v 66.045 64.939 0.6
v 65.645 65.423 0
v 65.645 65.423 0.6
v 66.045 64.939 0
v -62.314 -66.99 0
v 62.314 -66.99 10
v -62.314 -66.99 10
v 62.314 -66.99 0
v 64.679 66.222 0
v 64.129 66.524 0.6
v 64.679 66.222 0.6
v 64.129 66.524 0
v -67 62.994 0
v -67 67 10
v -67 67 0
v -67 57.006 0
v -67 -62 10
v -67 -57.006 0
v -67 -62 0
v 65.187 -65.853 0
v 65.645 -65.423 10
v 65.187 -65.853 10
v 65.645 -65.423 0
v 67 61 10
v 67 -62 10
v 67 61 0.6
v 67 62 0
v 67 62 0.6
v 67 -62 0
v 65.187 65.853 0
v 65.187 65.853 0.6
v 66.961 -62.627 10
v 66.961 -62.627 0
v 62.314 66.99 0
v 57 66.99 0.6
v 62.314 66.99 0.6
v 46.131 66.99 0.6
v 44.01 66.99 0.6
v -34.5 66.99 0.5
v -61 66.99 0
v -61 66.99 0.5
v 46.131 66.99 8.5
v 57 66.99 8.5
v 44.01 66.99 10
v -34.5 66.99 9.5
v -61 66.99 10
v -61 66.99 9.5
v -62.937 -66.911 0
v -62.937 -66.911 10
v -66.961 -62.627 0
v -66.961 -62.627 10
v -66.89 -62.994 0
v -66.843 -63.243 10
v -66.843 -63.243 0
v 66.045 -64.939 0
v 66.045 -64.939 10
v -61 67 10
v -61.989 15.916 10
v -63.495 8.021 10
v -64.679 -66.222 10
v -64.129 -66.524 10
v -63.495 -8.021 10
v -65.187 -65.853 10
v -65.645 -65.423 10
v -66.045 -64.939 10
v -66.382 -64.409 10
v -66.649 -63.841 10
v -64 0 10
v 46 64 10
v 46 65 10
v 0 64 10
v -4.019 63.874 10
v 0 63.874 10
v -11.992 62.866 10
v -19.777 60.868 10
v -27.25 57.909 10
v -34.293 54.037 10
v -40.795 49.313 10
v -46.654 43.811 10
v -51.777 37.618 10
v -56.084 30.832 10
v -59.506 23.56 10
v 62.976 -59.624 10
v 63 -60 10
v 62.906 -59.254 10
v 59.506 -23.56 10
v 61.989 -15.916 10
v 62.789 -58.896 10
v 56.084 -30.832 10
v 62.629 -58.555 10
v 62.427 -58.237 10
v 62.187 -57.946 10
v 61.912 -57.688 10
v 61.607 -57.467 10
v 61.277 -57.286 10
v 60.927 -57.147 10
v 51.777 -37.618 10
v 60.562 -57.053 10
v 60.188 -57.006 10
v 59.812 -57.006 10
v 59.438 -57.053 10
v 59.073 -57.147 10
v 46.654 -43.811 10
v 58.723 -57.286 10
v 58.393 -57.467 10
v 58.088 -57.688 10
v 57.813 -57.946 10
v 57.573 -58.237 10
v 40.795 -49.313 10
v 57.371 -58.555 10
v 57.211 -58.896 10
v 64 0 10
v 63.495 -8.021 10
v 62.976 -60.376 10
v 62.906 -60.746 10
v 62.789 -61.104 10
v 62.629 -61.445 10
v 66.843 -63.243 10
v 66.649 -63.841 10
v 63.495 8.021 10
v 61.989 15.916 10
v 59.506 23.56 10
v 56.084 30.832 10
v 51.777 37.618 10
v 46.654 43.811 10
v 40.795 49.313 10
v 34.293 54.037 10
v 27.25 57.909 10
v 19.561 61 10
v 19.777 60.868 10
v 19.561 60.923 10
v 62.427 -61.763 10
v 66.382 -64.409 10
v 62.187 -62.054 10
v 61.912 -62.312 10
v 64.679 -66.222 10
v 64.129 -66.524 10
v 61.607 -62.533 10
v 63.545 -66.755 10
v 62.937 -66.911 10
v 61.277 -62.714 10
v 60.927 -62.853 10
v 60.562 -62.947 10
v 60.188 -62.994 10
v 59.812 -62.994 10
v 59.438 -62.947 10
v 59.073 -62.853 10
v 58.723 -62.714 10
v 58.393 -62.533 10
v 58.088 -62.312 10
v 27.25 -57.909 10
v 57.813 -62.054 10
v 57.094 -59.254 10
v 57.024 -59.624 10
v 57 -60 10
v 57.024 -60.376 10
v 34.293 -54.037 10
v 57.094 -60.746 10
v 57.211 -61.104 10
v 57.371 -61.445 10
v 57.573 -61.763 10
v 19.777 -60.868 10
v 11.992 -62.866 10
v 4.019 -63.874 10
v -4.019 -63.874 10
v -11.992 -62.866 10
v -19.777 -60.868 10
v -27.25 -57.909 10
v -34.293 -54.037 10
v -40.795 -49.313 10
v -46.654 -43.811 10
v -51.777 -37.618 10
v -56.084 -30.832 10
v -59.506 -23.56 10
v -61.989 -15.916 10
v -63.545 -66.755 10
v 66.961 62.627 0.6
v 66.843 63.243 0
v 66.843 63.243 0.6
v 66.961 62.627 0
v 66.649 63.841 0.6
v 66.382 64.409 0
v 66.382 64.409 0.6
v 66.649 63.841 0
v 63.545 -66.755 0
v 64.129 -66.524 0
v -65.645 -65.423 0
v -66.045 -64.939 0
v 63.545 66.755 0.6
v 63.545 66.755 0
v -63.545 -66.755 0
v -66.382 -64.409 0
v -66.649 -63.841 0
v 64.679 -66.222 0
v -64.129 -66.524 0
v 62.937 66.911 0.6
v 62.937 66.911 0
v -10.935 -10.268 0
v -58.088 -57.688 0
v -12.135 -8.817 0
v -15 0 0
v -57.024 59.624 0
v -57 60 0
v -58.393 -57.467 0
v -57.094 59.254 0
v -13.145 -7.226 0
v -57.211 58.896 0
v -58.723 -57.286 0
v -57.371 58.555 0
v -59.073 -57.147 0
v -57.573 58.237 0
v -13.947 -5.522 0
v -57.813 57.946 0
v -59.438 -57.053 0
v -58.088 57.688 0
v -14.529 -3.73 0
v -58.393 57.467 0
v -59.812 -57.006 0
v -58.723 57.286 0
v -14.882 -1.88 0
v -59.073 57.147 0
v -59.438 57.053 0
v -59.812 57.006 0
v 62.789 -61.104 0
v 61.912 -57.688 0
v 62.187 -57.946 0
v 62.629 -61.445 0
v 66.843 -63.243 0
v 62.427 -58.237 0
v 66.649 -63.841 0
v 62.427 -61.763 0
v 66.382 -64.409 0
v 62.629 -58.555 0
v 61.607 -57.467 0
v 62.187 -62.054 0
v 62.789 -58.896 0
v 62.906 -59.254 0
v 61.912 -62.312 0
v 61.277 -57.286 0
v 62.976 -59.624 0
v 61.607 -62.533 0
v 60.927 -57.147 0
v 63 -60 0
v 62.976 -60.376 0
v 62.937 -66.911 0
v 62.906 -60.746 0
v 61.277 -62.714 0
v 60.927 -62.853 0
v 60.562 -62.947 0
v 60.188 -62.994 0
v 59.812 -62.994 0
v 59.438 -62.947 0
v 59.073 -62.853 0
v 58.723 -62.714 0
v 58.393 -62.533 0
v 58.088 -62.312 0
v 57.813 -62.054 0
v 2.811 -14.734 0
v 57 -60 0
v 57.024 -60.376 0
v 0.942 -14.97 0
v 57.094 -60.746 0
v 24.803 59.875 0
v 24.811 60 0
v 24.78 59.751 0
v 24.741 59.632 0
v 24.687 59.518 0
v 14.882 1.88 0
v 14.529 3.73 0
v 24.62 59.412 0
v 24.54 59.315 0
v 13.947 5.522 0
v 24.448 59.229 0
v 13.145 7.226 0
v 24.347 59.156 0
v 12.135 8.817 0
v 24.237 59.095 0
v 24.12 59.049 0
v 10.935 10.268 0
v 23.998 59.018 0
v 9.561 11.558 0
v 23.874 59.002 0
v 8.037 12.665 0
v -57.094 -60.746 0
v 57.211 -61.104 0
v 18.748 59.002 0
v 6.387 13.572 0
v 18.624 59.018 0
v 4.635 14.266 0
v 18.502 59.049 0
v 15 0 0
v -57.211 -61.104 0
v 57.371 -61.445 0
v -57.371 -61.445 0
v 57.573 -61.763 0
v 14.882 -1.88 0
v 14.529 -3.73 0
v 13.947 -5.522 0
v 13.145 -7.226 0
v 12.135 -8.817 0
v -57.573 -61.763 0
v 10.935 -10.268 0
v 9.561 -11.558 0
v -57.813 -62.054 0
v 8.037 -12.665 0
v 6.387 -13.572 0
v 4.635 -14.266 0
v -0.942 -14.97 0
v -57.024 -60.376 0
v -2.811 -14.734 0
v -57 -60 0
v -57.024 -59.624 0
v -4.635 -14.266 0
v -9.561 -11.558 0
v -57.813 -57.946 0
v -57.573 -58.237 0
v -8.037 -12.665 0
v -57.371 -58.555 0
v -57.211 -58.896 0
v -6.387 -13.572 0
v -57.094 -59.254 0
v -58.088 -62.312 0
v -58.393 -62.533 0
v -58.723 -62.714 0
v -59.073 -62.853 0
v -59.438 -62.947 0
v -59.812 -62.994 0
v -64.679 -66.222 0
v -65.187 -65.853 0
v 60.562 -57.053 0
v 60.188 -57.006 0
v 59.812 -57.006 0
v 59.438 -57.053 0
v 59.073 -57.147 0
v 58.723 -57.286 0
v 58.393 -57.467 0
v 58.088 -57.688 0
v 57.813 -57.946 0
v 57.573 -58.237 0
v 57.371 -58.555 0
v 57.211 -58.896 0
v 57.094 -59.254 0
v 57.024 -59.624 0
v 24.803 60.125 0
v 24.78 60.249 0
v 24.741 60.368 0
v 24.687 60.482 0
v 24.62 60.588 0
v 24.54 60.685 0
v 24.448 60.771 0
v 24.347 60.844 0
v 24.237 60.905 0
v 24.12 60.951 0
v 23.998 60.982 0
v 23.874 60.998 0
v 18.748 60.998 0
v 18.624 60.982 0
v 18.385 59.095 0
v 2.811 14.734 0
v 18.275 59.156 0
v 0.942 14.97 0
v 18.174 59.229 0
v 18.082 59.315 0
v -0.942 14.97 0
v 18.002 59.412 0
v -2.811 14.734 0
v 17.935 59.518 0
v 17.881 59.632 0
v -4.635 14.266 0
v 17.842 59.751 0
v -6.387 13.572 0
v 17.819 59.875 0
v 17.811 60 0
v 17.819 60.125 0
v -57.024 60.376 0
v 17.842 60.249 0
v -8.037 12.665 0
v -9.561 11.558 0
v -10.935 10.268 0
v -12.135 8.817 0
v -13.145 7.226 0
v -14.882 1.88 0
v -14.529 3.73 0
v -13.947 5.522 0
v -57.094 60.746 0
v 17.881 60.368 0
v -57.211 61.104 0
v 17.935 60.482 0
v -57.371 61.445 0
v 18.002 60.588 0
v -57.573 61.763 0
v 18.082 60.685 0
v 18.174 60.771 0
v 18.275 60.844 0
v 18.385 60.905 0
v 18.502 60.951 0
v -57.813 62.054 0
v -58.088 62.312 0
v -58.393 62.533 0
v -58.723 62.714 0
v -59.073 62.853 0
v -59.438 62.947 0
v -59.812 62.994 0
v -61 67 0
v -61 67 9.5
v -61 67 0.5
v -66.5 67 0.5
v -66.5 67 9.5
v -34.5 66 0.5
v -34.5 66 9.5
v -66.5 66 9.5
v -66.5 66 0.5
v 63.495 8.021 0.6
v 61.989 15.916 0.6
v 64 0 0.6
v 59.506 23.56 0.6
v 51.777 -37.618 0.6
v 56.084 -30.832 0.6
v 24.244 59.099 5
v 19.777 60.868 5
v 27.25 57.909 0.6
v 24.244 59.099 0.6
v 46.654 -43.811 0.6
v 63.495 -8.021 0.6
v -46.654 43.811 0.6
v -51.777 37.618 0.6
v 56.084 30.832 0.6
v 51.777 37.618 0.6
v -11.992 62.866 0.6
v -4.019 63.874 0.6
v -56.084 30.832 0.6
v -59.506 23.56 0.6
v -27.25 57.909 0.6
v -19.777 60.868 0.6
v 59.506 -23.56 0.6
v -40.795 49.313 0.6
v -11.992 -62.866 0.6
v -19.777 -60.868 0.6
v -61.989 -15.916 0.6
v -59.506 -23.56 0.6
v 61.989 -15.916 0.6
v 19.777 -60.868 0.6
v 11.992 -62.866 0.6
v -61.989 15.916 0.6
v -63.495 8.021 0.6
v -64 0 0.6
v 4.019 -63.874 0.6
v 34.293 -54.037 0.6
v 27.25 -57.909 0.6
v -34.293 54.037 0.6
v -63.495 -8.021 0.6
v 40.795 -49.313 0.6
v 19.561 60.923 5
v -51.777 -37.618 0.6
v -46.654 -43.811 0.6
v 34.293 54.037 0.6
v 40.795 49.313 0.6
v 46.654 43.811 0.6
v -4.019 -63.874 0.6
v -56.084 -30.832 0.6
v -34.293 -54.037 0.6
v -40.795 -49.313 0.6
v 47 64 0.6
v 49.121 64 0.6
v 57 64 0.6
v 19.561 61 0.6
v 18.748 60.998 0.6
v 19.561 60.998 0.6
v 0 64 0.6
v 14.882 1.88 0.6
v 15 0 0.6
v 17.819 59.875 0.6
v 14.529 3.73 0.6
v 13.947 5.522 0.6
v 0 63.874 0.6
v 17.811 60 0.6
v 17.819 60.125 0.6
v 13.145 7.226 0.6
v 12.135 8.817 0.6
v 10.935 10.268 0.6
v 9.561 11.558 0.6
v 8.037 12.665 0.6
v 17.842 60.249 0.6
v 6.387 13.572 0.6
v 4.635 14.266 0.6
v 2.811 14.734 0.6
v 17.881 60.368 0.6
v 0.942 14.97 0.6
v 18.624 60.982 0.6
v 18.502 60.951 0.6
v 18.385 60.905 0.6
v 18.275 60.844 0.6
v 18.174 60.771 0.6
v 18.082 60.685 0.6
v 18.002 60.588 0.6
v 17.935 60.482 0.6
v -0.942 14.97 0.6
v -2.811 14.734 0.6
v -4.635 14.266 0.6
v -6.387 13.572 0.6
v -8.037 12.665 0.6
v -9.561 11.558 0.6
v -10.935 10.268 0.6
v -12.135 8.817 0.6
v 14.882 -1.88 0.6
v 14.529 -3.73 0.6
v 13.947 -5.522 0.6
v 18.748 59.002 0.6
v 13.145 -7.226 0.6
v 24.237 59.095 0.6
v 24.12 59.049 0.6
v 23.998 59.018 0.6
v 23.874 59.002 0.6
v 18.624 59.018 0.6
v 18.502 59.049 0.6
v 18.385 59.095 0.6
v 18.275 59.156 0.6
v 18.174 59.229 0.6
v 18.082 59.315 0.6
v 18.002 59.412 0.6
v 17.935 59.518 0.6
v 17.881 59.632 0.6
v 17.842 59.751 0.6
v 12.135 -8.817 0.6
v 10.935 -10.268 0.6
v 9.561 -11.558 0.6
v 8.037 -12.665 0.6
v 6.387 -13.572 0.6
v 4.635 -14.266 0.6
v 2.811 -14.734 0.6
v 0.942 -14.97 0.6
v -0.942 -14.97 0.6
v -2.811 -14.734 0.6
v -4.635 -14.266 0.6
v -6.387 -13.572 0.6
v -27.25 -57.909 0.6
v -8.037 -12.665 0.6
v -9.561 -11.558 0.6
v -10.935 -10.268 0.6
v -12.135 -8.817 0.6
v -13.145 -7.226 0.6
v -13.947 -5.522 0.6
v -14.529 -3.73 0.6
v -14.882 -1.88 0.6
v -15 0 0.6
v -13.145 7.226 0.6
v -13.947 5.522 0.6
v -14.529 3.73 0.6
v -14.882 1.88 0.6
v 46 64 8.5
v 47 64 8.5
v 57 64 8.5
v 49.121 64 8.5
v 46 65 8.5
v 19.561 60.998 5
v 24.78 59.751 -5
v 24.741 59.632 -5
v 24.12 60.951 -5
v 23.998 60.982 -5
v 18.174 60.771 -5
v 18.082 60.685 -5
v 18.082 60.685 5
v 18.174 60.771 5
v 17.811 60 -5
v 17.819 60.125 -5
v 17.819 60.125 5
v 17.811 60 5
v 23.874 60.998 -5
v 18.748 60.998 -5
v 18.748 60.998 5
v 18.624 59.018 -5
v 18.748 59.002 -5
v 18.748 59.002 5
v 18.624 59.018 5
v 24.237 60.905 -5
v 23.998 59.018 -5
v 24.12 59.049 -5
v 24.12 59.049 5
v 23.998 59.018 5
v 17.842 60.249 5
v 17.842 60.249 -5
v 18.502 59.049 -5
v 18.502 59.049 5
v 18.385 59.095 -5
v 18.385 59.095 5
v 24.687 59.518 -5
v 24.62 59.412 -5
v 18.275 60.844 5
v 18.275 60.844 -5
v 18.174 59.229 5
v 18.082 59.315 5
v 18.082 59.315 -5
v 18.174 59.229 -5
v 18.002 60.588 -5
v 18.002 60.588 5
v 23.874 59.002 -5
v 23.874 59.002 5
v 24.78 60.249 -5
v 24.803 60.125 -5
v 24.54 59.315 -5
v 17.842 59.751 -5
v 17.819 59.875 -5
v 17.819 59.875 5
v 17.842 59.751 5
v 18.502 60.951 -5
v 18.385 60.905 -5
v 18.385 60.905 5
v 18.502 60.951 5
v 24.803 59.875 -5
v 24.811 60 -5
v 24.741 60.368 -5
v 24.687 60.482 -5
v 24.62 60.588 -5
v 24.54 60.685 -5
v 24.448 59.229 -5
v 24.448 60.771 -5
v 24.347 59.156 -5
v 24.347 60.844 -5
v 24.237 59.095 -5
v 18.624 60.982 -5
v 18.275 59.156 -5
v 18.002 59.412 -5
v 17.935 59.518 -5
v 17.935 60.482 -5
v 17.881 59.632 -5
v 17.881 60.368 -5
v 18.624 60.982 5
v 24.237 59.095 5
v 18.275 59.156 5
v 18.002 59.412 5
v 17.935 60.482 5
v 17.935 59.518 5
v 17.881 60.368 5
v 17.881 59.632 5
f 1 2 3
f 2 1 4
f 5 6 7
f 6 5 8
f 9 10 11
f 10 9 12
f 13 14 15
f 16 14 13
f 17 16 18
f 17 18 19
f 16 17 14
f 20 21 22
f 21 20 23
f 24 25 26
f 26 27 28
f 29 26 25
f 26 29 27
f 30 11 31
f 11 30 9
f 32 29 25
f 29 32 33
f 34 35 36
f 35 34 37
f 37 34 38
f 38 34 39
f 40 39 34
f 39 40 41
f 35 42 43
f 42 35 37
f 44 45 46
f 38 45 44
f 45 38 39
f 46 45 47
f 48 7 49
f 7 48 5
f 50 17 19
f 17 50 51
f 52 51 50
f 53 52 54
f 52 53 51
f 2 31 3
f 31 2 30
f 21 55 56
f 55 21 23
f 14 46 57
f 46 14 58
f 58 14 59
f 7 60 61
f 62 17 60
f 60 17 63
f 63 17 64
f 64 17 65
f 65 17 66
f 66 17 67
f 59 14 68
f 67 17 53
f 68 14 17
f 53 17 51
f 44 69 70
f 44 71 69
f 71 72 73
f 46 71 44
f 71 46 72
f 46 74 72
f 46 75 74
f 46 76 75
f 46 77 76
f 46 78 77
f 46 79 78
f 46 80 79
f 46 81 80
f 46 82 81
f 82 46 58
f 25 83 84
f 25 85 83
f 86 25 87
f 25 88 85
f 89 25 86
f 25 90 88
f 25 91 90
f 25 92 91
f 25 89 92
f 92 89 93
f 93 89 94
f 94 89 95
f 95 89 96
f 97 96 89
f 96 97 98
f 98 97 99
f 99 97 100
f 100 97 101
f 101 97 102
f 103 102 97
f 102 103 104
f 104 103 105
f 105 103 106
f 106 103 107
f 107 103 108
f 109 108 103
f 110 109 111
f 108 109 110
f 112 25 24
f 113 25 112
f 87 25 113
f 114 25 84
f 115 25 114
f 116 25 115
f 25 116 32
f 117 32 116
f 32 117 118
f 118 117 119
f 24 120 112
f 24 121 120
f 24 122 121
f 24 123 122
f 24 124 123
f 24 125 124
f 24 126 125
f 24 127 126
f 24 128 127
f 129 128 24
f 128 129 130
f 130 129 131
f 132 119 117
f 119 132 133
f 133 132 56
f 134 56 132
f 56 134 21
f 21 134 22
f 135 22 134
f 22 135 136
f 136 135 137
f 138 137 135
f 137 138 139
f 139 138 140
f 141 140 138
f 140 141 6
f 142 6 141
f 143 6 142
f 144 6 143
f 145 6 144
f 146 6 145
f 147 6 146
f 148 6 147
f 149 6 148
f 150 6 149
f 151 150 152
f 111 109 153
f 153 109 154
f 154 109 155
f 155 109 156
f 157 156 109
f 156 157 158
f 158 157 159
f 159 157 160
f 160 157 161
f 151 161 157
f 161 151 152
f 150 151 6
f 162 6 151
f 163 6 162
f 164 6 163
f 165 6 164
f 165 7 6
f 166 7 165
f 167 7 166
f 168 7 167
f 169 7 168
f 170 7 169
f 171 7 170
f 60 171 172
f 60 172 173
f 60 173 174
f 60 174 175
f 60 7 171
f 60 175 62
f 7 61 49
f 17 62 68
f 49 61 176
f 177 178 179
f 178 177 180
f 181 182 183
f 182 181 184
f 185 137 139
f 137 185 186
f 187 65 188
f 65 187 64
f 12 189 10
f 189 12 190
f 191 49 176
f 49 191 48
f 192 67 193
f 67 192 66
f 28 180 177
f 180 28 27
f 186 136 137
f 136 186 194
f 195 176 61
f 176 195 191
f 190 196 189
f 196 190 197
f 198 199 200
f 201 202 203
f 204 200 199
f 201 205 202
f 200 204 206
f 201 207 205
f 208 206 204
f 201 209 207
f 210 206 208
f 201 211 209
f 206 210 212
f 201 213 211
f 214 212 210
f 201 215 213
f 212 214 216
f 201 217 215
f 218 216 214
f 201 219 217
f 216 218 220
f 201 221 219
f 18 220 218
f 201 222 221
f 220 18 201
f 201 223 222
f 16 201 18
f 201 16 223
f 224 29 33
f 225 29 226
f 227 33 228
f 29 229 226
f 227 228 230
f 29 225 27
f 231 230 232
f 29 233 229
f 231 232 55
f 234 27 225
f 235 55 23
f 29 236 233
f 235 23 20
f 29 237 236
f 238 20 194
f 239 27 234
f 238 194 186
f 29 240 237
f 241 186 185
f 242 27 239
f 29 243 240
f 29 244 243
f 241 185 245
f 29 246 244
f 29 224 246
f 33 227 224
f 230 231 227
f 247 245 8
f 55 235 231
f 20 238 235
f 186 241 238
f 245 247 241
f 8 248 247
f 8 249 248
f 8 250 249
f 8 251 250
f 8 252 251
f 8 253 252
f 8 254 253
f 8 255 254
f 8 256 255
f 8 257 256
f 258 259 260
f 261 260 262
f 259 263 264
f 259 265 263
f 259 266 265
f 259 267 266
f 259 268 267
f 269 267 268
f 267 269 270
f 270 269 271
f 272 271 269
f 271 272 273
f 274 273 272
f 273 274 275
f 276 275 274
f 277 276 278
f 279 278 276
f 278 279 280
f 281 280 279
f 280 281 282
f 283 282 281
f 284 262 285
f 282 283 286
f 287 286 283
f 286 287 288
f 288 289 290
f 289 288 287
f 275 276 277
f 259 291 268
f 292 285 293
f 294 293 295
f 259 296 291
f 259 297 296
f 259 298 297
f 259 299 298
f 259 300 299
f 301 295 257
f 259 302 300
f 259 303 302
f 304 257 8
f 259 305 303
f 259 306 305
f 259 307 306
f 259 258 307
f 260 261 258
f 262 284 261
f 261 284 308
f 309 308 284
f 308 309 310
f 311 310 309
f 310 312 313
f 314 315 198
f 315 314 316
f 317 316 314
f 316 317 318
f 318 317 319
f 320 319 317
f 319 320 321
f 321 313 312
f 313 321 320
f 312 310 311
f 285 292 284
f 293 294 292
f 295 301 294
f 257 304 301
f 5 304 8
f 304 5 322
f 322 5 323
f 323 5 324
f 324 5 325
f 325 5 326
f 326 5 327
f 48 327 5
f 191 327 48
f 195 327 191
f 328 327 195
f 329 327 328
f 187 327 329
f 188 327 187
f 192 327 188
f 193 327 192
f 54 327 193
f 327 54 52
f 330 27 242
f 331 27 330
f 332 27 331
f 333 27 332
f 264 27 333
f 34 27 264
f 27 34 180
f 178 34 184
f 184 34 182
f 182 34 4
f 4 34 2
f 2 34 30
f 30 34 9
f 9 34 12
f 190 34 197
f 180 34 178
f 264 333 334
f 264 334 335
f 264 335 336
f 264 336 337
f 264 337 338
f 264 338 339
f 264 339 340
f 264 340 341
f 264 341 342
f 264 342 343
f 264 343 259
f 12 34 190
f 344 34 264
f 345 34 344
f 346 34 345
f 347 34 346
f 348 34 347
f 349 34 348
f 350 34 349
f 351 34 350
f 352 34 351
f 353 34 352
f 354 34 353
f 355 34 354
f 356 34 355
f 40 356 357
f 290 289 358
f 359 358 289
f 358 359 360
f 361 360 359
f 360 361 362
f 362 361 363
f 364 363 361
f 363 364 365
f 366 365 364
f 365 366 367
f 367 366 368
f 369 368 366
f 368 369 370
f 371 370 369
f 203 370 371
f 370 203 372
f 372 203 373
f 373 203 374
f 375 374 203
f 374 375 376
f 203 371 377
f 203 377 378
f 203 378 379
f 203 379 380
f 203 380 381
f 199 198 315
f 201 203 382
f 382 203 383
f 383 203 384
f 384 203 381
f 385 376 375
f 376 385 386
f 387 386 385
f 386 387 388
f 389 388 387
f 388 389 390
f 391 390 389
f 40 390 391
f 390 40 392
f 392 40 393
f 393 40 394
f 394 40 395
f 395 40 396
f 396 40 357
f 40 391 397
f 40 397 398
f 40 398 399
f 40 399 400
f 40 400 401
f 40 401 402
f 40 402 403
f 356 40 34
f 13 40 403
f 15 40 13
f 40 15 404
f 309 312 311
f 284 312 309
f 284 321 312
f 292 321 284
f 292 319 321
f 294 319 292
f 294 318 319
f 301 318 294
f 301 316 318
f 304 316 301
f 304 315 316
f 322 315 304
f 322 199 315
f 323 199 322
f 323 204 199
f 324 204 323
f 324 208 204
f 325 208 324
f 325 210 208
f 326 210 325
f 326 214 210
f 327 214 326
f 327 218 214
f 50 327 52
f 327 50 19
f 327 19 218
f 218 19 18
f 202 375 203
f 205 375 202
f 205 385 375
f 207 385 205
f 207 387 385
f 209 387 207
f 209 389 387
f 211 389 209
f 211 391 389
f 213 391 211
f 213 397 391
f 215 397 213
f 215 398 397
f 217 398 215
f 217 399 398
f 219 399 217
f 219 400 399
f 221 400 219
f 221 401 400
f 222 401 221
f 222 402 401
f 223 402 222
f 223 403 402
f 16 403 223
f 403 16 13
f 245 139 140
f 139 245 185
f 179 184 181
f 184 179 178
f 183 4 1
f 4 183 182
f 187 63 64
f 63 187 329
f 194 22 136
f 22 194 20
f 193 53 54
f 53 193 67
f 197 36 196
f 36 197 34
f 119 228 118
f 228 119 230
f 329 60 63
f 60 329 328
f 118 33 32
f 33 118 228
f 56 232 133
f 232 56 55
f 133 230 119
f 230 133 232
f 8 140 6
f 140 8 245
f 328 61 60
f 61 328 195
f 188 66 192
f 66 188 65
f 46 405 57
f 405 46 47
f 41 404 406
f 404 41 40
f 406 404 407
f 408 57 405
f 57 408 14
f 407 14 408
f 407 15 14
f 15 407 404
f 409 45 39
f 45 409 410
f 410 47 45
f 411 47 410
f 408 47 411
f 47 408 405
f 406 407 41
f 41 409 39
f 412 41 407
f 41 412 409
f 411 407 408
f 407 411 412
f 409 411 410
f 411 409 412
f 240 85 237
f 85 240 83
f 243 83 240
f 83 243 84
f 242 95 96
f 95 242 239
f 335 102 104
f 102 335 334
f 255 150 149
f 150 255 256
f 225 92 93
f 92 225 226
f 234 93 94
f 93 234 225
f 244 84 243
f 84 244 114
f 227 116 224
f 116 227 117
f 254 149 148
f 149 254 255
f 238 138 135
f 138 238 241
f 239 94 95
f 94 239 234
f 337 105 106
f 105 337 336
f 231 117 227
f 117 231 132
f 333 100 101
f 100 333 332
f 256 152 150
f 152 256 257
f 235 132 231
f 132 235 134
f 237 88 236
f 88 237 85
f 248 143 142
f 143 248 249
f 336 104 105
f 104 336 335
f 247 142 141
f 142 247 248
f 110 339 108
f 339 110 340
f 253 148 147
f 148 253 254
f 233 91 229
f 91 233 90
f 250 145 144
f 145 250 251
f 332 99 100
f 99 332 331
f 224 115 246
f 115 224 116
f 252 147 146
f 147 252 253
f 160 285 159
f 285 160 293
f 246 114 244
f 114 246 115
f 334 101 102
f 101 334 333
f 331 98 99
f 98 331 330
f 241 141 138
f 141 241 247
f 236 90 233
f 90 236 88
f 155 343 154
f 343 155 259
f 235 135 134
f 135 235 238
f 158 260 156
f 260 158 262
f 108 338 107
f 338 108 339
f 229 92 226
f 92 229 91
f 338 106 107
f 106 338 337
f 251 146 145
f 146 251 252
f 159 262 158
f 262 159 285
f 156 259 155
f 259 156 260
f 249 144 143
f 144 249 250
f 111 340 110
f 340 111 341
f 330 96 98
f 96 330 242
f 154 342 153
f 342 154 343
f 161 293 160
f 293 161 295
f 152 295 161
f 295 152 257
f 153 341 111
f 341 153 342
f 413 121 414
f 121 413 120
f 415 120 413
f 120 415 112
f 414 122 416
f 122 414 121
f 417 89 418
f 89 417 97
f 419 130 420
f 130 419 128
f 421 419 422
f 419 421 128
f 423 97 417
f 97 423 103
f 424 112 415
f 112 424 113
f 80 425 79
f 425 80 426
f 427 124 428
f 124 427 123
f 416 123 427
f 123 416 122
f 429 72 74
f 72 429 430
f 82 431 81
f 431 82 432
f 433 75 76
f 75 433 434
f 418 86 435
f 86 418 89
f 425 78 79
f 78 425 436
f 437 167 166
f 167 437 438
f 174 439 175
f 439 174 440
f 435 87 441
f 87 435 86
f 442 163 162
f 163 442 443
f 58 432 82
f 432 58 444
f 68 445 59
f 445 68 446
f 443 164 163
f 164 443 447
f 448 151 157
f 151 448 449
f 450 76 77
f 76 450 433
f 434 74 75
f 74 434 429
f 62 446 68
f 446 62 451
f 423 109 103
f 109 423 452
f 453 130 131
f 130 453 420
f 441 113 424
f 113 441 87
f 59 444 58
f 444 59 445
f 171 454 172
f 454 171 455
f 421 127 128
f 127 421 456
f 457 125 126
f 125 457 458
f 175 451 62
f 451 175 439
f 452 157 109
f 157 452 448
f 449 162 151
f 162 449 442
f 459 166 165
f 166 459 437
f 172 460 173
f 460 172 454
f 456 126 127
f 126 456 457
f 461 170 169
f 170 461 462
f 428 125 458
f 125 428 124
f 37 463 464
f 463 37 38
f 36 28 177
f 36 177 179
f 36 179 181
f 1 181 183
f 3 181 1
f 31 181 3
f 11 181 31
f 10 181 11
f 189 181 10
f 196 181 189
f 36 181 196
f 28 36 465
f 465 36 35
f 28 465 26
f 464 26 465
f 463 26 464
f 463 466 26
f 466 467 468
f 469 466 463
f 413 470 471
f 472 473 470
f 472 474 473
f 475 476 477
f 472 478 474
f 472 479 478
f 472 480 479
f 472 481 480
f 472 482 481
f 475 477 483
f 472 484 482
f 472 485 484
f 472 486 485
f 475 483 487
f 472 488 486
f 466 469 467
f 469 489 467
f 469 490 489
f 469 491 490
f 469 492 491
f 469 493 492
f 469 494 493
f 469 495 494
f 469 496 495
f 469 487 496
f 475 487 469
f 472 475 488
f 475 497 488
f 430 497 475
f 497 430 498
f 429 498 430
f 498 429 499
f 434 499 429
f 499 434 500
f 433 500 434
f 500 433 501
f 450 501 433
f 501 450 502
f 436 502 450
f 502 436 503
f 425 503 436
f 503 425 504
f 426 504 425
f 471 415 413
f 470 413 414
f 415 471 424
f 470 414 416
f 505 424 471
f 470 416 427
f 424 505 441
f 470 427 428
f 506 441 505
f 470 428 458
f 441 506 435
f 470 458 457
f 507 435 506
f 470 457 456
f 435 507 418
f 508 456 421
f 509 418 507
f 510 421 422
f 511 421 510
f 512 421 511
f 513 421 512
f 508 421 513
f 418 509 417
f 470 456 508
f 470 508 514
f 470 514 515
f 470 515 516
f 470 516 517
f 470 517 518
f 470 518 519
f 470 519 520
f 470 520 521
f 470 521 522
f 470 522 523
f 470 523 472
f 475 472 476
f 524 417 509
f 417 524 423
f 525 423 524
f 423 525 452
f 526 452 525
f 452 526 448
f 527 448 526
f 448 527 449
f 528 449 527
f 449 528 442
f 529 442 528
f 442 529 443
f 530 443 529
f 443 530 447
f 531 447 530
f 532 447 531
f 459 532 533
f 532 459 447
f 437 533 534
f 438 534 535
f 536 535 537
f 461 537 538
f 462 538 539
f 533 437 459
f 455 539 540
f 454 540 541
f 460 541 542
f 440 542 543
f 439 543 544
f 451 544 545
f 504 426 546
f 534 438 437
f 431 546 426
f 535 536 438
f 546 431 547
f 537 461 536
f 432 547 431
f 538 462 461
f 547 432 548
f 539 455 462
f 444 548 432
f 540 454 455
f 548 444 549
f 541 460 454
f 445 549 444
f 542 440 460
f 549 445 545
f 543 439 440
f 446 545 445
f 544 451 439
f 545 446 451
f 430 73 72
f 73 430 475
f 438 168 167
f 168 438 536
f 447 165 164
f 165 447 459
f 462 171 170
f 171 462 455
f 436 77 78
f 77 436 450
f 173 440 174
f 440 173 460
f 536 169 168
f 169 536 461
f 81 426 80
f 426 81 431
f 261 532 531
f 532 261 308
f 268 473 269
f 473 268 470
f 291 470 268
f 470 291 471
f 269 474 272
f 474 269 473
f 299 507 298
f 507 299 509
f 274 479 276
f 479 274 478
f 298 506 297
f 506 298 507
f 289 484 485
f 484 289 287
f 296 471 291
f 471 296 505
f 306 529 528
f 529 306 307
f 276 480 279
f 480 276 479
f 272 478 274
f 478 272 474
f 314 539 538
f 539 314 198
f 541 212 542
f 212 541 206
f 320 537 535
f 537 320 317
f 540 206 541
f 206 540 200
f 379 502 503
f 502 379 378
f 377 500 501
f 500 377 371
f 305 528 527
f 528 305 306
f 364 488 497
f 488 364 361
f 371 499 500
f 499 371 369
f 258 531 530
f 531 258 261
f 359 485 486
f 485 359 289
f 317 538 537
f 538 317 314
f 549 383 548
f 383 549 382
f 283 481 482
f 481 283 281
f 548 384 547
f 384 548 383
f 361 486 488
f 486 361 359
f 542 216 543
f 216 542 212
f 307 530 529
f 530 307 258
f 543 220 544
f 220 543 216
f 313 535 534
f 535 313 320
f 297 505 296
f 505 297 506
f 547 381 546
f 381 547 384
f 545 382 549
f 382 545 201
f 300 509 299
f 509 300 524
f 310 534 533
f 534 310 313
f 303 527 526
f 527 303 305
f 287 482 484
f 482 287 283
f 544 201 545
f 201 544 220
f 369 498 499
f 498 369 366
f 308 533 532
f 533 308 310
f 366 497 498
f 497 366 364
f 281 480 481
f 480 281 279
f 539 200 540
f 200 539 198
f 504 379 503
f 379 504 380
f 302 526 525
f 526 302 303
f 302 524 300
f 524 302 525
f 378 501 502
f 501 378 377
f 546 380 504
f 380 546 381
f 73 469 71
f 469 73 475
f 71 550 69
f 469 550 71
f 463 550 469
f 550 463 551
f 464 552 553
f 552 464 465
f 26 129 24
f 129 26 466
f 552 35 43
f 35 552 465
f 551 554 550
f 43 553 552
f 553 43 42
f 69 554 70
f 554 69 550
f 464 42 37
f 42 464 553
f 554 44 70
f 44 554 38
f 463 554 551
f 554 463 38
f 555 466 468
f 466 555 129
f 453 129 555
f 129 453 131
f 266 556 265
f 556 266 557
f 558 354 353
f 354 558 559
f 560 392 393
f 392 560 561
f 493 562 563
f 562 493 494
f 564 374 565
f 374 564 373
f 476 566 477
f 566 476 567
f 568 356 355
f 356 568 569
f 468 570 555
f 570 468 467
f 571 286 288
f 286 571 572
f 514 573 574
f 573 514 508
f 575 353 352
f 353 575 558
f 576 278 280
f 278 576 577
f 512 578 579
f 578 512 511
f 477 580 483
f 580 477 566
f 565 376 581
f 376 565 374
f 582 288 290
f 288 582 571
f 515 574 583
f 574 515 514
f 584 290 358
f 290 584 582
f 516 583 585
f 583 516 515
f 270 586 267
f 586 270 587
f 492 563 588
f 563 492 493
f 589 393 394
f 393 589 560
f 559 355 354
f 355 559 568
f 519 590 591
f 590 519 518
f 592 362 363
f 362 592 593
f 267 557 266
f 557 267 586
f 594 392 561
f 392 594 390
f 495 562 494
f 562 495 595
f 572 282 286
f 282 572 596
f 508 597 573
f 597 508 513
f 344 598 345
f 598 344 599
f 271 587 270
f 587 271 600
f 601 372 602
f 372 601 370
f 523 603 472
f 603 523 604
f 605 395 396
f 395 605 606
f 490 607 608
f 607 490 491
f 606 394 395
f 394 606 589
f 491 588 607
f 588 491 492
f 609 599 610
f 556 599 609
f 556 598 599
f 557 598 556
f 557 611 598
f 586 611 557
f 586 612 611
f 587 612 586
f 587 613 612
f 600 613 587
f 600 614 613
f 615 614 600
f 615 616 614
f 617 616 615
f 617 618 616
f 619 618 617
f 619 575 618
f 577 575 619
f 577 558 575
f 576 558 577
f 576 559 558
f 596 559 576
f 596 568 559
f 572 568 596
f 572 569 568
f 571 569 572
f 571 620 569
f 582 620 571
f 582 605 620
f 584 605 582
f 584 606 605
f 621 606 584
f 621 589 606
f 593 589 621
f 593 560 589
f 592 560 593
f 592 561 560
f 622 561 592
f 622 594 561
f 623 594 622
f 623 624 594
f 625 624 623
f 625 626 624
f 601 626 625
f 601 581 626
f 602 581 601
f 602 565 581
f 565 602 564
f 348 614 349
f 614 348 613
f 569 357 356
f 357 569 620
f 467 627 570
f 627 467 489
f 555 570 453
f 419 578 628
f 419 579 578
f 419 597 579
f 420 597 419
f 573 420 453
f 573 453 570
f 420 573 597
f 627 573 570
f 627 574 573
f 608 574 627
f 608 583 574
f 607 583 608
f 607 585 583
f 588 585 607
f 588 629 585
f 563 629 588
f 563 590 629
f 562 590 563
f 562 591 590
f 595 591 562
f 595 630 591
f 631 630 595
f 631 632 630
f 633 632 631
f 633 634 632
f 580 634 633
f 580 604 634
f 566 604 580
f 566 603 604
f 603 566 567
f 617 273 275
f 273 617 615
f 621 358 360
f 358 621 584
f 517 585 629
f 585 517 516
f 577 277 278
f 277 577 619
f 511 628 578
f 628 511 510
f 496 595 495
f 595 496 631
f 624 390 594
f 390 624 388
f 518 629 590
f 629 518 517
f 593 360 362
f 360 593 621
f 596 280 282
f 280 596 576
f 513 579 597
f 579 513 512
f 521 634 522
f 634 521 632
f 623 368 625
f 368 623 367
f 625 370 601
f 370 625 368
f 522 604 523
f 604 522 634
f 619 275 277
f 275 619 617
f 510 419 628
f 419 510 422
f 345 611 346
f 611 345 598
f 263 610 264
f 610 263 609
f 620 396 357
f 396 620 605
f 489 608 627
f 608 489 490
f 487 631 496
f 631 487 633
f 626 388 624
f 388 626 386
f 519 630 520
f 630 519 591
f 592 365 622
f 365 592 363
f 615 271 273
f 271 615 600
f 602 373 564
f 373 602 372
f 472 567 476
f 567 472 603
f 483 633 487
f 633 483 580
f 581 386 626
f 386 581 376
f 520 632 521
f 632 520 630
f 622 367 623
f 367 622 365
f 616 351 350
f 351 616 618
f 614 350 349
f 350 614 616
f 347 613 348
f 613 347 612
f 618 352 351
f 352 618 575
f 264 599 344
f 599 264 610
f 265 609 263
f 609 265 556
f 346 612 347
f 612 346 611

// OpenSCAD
$fn = 50;


union() {
	difference() {
		union() {
			hull() {
				translate(v = [-62.0000000000, 62.0000000000, 0]) {
					cylinder(h = 10, r = 5);
				}
				translate(v = [62.0000000000, 62.0000000000, 0]) {
					cylinder(h = 10, r = 5);
				}
				translate(v = [-62.0000000000, -62.0000000000, 0]) {
					cylinder(h = 10, r = 5);
				}
				translate(v = [62.0000000000, -62.0000000000, 0]) {
					cylinder(h = 10, r = 5);
				}
			}
			translate(v = [-67.0000000000, 61.0000000000, 0]) {
				cube(size = [6, 6, 10]);
			}
		}
		union() {
			translate(v = [-67.5000000000, -60.0000000000, -250.0000000000]) {
				rotate(a = [0, 0, 0]) {
					difference() {
						union() {
							hull() {
								translate(v = [7.5000000000, 0, 0]) {
									cylinder(h = 250, r = 3.0000000000, r1 = 3.0000000000, r2 = 3.0000000000);
								}
								translate(v = [-7.5000000000, 0, 0]) {
									cylinder(h = 250, r = 3.0000000000, r1 = 3.0000000000, r2 = 3.0000000000);
								}
							}
						}
						union();
					}
				}
			}
			translate(v = [-67.5000000000, 60.0000000000, -250.0000000000]) {
				rotate(a = [0, 0, 0]) {
					difference() {
						union() {
							hull() {
								translate(v = [7.5000000000, 0, 0]) {
									cylinder(h = 250, r = 3.0000000000, r1 = 3.0000000000, r2 = 3.0000000000);
								}
								translate(v = [-7.5000000000, 0, 0]) {
									cylinder(h = 250, r = 3.0000000000, r1 = 3.0000000000, r2 = 3.0000000000);
								}
							}
						}
						union();
					}
				}
			}
			translate(v = [-66.5000000000, 66.0000000000, 0.5000000000]) {
				cube(size = [32, 1, 9.0000000000]);
			}
			translate(v = [60.0000000000, -60.0000000000, 0]) {
				cylinder(h = 100, r = 3.0000000000);
			}
			translate(v = [0, 0, 0.6000000000]) {
				cylinder(h = 12.4000000000, r = 64.0000000000);
			}
			translate(v = [0, 0, -5.0000000000]) {
				cylinder(h = 10, r = 15.0000000000);
			}
			translate(v = [0.0000000000, 61.0000000000, 0.6000000000]) {
				cube(size = [67.0000000000, 3, 12.4000000000]);
			}
			translate(v = [57.0000000000, 61.0000000000, 0.6000000000]) {
				cube(size = [10, 6, 12.4000000000]);
			}
			translate(v = [46.0000000000, 61.0000000000, 8.5000000000]) {
				cube(size = [21, 6, 1.5000000000]);
			}
			translate(v = [43.2500000000, 67.7500000000, 0.6000000000]) {
				rotate(a = [0, 0, -45]) {
					cube(size = [7.5000000000, 1.5000000000, 12.4000000000]);
				}
			}
			translate(v = [12.0610000000, 59.0000000000, 0.6000000000]) {
				cube(size = [7.5000000000, 2, 9.4000000000]);
			}
		}
	}
	union() {
		translate(v = [21.3110000000, 60.0000000000, -5.0000000000]) {
			rotate(a = [0, 0, 0]) {
				difference() {
					union() {
						#hull() {
							#translate(v = [2.5000000000, 0, 0]) {
								cylinder(h = 10, r = 1.0000000000, r1 = 1.0000000000, r2 = 1.0000000000);
							}
							#translate(v = [-2.5000000000, 0, 0]) {
								cylinder(h = 10, r = 1.0000000000, r1 = 1.0000000000, r2 = 1.0000000000);
							}
						}
					}
					union();
				}
			}
		}
	}
}
